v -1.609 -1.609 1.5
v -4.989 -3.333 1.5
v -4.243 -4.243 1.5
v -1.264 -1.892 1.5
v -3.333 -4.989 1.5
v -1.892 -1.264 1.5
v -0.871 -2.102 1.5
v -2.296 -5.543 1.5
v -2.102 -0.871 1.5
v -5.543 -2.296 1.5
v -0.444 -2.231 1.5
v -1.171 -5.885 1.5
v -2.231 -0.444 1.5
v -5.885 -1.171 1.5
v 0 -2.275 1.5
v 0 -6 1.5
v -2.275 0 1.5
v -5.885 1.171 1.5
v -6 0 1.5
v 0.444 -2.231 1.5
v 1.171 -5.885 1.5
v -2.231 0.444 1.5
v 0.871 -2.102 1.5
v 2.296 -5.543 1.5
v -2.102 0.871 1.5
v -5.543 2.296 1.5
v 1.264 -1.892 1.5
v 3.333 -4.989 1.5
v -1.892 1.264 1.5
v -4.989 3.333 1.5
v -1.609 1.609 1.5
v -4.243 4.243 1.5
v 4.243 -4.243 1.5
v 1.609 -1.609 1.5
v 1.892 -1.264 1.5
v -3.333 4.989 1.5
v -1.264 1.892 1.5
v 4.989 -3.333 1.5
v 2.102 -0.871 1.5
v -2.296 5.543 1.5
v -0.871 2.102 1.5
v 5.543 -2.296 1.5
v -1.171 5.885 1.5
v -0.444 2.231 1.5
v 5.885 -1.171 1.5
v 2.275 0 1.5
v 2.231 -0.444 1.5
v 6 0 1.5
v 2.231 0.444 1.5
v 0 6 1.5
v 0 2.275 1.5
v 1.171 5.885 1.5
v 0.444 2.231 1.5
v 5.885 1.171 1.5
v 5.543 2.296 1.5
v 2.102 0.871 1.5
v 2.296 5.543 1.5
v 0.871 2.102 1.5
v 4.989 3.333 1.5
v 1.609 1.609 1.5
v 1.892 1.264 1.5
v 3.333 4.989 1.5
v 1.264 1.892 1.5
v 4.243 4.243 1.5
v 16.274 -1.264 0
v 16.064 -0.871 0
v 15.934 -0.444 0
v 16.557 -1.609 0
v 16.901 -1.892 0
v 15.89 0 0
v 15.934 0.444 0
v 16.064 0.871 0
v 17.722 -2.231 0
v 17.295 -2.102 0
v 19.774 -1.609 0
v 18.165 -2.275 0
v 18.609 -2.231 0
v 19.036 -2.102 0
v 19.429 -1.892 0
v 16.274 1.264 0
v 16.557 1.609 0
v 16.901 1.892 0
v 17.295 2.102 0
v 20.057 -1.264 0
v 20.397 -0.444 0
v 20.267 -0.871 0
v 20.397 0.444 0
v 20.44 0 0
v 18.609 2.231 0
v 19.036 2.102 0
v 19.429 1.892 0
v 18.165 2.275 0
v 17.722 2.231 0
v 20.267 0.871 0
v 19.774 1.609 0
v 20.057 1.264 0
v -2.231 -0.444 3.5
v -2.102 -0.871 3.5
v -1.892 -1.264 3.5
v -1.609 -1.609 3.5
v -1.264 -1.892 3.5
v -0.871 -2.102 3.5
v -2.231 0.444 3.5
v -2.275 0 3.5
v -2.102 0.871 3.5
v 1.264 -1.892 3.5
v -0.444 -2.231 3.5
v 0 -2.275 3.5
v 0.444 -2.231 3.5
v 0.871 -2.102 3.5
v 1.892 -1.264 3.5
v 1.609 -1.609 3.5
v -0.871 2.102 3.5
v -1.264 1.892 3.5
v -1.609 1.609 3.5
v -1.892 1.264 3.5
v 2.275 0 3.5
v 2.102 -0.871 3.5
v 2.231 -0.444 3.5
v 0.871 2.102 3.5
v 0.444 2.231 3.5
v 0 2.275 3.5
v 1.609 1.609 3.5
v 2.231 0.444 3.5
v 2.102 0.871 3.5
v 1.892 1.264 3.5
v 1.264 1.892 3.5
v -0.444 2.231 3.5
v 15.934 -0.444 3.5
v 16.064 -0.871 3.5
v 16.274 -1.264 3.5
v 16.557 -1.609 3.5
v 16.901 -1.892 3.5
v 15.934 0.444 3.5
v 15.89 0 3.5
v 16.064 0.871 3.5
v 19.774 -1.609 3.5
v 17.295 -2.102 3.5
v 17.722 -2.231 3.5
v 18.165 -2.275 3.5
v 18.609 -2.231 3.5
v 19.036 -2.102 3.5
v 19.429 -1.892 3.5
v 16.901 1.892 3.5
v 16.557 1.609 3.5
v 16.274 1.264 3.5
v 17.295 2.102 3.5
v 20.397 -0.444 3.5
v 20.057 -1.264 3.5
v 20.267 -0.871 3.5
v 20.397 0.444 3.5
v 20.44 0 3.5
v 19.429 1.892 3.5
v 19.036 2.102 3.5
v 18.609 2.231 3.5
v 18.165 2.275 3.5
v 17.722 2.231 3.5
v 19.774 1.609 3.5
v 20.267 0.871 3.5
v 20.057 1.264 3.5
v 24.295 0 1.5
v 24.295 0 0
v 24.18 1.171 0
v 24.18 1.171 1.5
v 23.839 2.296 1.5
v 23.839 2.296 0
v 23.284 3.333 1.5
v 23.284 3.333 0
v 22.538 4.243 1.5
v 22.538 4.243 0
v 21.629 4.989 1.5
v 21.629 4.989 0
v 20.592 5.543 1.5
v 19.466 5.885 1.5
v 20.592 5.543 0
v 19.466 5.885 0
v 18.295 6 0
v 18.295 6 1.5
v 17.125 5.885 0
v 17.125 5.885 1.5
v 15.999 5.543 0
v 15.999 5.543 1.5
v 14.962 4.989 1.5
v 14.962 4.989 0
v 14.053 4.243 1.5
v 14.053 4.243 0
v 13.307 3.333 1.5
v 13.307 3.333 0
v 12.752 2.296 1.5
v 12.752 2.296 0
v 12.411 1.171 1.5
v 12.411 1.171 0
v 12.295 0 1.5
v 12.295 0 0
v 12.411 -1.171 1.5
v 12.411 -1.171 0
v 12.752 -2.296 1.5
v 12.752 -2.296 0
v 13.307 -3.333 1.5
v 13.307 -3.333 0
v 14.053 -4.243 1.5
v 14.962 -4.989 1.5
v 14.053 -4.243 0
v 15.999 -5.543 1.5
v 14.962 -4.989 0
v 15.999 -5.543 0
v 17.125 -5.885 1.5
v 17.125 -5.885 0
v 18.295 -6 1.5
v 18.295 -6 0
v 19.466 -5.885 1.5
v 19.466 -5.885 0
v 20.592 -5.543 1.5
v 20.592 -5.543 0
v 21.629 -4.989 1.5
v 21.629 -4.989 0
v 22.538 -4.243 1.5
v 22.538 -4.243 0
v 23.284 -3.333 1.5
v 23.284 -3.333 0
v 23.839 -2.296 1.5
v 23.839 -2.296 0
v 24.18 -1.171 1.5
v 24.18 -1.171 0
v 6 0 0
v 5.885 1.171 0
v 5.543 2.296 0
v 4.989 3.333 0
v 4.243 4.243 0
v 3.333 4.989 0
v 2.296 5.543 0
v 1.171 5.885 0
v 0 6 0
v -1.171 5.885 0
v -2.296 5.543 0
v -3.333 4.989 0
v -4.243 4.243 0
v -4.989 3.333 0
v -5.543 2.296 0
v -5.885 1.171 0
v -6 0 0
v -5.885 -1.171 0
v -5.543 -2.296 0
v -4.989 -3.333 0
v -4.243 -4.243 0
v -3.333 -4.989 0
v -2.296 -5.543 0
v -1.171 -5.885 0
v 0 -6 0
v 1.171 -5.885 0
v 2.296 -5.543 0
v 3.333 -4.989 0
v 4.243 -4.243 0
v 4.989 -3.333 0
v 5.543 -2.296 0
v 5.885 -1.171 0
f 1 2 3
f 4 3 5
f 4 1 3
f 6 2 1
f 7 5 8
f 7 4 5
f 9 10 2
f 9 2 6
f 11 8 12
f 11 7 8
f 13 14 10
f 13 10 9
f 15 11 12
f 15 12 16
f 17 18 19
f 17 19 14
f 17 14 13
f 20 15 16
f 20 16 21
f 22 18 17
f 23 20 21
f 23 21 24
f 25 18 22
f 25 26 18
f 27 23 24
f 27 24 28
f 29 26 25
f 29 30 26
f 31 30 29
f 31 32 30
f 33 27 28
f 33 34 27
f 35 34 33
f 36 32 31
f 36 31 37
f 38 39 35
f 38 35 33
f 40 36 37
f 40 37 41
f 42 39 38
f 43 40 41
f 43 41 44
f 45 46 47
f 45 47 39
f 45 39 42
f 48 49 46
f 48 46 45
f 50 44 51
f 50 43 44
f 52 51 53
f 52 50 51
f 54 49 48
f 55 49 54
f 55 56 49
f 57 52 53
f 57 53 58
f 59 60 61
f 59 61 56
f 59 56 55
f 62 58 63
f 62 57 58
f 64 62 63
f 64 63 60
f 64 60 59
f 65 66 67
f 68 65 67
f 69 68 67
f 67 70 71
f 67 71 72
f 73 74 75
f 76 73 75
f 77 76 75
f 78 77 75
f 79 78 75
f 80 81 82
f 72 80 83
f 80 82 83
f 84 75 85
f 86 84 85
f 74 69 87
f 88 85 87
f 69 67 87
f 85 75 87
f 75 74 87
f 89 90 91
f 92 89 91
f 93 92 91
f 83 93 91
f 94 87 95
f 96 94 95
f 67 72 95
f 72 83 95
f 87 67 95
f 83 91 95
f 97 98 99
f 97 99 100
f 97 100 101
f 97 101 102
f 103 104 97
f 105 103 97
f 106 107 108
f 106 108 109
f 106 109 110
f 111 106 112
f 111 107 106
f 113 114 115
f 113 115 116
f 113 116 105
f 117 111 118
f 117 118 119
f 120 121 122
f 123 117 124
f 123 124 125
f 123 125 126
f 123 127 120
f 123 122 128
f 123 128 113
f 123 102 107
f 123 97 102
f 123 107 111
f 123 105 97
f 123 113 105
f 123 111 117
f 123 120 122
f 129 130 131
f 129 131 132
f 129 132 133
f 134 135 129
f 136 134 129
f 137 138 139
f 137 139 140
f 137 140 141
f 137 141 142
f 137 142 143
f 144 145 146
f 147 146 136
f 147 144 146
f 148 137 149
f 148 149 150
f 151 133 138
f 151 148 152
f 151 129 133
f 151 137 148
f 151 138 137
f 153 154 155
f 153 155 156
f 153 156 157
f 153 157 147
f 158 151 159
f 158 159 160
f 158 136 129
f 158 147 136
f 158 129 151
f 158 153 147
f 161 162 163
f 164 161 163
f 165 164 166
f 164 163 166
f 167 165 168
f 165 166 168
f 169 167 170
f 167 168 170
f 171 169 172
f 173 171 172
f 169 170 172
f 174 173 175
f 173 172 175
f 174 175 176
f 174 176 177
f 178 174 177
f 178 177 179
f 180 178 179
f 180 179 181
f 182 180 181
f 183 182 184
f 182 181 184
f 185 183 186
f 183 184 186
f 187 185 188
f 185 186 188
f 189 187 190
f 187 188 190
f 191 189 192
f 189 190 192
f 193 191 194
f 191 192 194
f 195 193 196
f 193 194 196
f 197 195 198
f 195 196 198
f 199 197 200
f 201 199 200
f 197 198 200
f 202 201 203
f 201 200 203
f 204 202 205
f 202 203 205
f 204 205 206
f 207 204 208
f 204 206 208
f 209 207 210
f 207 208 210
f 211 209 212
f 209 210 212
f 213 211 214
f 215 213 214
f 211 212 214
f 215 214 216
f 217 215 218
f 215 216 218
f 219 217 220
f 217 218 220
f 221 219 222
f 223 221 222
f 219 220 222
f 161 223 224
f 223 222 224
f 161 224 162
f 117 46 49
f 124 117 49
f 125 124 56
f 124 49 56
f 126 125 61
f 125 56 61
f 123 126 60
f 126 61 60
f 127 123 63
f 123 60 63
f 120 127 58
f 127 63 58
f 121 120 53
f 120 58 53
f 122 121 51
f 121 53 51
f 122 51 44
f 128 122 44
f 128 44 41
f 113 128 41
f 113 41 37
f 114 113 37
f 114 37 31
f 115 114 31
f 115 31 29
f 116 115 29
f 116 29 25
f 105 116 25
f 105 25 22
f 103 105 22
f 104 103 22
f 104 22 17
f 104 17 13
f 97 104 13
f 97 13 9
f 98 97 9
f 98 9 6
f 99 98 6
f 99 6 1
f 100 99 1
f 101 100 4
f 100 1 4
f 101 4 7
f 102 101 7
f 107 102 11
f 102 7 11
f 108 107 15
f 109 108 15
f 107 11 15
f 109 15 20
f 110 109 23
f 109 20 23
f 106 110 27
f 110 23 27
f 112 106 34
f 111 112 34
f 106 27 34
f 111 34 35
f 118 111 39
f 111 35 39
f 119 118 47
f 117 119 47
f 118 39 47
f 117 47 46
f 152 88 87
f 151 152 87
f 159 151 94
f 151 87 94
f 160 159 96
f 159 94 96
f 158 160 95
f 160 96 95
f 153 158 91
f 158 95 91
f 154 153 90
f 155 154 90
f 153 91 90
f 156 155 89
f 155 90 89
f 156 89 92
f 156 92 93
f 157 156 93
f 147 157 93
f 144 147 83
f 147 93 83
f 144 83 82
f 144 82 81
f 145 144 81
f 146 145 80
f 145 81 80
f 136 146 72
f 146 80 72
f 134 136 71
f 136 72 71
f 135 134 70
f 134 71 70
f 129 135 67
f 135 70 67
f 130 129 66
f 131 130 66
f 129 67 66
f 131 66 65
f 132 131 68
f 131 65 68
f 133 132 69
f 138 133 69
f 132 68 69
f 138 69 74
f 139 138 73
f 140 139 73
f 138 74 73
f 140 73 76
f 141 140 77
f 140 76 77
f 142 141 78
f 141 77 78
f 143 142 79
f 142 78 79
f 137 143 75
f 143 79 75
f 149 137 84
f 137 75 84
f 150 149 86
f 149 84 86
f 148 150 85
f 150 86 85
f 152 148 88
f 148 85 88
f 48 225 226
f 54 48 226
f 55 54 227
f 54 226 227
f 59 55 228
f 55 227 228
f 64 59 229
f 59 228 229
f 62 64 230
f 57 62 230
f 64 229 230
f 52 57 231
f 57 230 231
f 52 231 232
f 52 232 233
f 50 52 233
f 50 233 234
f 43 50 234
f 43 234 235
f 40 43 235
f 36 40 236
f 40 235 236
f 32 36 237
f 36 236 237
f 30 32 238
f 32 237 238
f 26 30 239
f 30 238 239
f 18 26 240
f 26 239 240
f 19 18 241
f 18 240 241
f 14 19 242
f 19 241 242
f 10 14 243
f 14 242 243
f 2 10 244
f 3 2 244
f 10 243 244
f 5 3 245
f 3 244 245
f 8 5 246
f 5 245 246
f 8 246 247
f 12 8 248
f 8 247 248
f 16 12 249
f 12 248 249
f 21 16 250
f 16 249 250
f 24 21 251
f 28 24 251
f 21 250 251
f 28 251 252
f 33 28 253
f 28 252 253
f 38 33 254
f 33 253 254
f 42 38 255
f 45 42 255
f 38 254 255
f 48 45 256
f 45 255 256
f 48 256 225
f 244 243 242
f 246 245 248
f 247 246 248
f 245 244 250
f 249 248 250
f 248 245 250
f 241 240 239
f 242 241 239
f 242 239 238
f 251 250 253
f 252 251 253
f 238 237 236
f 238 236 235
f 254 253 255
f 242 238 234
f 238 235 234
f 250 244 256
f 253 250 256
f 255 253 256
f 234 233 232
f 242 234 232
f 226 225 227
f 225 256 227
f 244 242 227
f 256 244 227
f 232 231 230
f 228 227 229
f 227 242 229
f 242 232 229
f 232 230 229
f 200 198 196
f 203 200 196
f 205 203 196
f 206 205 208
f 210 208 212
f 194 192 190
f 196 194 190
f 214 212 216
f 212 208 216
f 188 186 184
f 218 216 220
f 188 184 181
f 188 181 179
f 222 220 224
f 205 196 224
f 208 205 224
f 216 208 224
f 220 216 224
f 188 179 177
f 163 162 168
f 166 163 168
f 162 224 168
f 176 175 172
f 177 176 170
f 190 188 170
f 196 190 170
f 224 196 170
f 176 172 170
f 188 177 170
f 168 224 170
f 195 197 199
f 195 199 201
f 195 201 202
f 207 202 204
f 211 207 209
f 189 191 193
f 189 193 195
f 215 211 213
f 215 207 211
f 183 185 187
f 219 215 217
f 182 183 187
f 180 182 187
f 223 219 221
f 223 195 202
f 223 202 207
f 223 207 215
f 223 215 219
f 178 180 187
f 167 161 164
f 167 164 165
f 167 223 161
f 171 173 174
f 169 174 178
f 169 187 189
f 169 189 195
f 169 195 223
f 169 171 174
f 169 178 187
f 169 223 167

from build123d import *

# Parameters (mm, degrees)
F0_R     = 6
F1_DEPTH = 1.5
F2_R     = 2.275
F3_DEPTH = 3.5


with BuildPart() as f1:
    # F0 (on Top) → F1 (new body)
    with BuildSketch(Plane.XY):
        Circle(F0_R)
    extrude(amount=F1_DEPTH)

    # F2 (on Top) → F3 (join)
    with BuildSketch(Plane.XY):
        Circle(F2_R)
    extrude(amount=F3_DEPTH)


with BuildPart() as f1b:
    # F0 (on Top) → F1, piece 2 (new body)
    with BuildSketch(Plane.XY):
        with Locations((18.2954519987, 0)):
            Circle(F0_R)
    extrude(amount=F1_DEPTH)


with BuildPart() as f3:
    # F2 (on Top) → F3, piece 2 (new body)
    with BuildSketch(Plane.XY):
        with Locations((18.1653685868, 0)):
            Circle(F2_R)
    extrude(amount=F3_DEPTH)


solid = Compound([f1.part, f1b.part, f3.part])
